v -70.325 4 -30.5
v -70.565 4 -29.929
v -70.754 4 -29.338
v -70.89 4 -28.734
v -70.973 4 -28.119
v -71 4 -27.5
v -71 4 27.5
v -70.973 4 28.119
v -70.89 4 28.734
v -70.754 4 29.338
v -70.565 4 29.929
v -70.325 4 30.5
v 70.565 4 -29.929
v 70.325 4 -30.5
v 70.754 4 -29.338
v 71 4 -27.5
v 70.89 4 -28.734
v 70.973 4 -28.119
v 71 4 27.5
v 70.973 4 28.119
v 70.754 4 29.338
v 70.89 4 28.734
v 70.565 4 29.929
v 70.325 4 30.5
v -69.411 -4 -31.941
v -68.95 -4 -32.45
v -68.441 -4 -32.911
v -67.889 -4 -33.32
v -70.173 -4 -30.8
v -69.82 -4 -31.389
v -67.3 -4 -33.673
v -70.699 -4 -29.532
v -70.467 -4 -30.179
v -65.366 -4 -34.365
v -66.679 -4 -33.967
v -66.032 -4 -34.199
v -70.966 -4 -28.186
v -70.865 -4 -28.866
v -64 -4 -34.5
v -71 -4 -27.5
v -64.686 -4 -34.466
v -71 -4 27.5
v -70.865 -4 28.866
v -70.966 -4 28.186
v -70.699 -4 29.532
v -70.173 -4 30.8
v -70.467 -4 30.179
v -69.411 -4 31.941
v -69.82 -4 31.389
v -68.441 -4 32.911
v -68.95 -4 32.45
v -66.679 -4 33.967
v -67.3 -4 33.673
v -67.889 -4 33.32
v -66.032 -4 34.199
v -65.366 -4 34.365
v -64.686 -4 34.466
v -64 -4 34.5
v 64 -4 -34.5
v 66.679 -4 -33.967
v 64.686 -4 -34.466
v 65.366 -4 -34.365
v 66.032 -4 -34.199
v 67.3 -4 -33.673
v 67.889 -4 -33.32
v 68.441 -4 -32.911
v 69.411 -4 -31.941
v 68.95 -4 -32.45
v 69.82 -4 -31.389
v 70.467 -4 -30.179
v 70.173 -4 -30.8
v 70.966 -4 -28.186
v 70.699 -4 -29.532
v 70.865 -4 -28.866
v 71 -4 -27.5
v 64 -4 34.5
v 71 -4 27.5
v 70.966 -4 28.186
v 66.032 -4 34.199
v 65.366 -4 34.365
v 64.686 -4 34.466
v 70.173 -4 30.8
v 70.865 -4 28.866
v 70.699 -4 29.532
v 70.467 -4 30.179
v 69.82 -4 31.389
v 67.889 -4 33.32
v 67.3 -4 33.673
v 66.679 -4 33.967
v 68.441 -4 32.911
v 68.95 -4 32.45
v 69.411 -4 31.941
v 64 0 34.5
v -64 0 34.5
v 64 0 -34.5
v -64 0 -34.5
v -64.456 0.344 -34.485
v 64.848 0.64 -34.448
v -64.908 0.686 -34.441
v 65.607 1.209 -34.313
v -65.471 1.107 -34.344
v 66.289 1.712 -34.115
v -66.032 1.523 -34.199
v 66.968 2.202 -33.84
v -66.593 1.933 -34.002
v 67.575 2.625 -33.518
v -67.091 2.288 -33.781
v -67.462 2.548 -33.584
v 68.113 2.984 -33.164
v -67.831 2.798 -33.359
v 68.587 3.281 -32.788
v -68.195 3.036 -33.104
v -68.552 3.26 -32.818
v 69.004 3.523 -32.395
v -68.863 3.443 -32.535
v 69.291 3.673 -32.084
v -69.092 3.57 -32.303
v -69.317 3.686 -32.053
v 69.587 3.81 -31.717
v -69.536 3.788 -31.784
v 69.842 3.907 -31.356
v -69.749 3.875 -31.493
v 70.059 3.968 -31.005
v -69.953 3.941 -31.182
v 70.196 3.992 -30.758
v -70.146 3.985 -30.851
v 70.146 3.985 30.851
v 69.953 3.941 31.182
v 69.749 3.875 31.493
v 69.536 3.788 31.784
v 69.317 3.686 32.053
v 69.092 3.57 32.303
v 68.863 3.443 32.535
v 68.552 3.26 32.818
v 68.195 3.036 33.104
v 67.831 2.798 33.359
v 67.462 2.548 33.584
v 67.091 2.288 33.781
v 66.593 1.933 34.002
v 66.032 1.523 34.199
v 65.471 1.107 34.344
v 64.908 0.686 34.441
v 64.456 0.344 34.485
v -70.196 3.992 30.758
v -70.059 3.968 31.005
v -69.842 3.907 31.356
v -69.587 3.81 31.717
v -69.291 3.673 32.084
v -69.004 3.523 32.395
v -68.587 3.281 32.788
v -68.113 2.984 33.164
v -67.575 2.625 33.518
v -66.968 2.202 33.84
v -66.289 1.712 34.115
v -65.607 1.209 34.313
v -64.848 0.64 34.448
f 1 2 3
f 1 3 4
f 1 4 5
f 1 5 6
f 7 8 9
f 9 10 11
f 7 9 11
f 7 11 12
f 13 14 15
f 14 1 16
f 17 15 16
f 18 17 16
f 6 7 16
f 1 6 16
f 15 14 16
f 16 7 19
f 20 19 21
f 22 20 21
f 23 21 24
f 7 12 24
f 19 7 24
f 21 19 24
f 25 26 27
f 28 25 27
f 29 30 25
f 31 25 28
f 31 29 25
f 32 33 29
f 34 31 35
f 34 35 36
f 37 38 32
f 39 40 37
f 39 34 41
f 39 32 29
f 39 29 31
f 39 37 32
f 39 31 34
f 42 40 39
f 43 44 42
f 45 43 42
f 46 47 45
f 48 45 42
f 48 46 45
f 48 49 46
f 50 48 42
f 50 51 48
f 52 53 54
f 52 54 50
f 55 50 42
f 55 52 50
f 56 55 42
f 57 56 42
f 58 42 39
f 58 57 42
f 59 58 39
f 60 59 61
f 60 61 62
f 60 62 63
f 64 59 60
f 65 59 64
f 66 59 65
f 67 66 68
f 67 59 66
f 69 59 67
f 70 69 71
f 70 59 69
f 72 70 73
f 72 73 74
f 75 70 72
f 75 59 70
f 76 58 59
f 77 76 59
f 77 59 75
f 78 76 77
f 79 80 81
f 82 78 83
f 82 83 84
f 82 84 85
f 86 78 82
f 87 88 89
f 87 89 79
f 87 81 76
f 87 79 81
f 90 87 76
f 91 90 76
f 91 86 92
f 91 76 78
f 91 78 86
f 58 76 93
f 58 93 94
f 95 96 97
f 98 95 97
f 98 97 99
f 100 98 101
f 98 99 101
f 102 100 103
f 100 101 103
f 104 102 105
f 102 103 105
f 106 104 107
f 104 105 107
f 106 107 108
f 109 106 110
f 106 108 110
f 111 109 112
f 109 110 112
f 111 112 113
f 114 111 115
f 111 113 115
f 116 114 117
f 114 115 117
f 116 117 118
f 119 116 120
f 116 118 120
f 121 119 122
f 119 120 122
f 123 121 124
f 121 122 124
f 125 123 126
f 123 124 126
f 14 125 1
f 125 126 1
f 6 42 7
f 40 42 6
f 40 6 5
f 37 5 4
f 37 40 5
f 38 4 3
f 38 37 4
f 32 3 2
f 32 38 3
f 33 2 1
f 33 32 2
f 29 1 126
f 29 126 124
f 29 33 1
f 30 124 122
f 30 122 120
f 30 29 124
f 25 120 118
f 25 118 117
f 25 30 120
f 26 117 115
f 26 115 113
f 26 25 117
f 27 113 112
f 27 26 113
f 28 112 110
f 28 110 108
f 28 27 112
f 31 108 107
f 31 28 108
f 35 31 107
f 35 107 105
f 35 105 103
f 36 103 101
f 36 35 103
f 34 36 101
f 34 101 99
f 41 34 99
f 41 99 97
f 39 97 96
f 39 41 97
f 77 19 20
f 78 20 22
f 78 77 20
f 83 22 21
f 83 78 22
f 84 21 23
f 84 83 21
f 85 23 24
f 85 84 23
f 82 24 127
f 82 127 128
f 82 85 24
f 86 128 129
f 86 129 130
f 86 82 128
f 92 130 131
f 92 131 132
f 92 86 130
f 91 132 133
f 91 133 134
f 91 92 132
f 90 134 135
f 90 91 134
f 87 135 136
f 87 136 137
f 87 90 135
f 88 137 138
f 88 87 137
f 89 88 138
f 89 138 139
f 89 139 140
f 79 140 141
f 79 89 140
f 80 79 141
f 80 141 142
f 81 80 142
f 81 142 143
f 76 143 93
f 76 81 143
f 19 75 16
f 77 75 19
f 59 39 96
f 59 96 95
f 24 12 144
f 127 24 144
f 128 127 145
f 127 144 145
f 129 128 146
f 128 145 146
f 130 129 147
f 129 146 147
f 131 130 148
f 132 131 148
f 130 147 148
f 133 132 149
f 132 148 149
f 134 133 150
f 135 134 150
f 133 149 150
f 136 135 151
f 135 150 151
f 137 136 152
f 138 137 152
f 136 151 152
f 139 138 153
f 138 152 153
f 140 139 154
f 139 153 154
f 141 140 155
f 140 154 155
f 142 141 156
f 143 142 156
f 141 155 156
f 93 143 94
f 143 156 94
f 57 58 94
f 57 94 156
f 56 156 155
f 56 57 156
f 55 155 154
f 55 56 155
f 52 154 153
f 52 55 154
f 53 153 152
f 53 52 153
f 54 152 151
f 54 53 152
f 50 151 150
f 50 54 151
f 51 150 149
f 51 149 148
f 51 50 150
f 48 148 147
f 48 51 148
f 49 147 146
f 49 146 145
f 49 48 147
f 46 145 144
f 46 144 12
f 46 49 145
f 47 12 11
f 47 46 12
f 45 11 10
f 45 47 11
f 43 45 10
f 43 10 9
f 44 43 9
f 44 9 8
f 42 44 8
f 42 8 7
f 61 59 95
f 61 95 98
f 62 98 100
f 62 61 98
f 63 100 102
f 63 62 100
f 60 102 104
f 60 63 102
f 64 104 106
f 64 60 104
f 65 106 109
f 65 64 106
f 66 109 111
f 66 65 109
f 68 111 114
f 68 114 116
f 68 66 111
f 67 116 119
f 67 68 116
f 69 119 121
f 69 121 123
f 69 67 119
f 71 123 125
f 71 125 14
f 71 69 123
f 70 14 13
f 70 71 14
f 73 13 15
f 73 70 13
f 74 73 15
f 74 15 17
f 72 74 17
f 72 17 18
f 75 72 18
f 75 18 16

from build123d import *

# Parameters (mm, degrees)
F1_DEPTH      = 4
F1_DEPTH_BACK = 4
F2_T1_DEPTH   = 148


# Not quite as in the source:
# - a fillet or chamfer that OpenCascade refuses, or shapes differently, is made with other operations: its cross-section is extruded or revolved along the edge and cut away or added


with BuildPart() as f1:
    # F0 (on Front) → F1 (new body, two sides)
    with BuildSketch(Plane.XZ) as f1_sk:
        with BuildLine():
            Line((-64, -34.5), (64, -34.5))
            ThreePointArc((64, -34.5), (68.9497474683, -32.4497474683), (71, -27.5))
            Line((71, -27.5), (71, 27.5))
            ThreePointArc((71, 27.5), (68.9497474683, 32.4497474683), (64, 34.5))
            Line((64, 34.5), (-64, 34.5))
            ThreePointArc((-64, 34.5), (-68.9497474683, 32.4497474683), (-71, 27.5))
            Line((-71, 27.5), (-71, -27.5))
            ThreePointArc((-71, -27.5), (-68.9497474683, -32.4497474683), (-64, -34.5))
        make_face()
    extrude(amount=F1_DEPTH)
    extrude(f1_sk.sketch, amount=-F1_DEPTH_BACK)

    # F2: fillet of radius 4 on 2 edges, made by hand

    # F2_s2 → F2_t1 (cut)
    with BuildSketch(Plane.YZ.offset(-74)):
        with BuildLine():
            ThreePointArc((4, 30.5), (2.8284271247, 33.3284271247), (0, 34.5))
            Line((0, 34.5), (4, 34.5))
            Line((4, 34.5), (4, 30.5))
        make_face()
        with BuildLine():
            ThreePointArc((0, -34.5), (2.8284271247, -33.3284271247), (4, -30.5))
            Line((4, -30.5), (4, -34.5))
            Line((4, -34.5), (0, -34.5))
        make_face()
    extrude(amount=F2_T1_DEPTH, mode=Mode.SUBTRACT)


solid = f1.part
